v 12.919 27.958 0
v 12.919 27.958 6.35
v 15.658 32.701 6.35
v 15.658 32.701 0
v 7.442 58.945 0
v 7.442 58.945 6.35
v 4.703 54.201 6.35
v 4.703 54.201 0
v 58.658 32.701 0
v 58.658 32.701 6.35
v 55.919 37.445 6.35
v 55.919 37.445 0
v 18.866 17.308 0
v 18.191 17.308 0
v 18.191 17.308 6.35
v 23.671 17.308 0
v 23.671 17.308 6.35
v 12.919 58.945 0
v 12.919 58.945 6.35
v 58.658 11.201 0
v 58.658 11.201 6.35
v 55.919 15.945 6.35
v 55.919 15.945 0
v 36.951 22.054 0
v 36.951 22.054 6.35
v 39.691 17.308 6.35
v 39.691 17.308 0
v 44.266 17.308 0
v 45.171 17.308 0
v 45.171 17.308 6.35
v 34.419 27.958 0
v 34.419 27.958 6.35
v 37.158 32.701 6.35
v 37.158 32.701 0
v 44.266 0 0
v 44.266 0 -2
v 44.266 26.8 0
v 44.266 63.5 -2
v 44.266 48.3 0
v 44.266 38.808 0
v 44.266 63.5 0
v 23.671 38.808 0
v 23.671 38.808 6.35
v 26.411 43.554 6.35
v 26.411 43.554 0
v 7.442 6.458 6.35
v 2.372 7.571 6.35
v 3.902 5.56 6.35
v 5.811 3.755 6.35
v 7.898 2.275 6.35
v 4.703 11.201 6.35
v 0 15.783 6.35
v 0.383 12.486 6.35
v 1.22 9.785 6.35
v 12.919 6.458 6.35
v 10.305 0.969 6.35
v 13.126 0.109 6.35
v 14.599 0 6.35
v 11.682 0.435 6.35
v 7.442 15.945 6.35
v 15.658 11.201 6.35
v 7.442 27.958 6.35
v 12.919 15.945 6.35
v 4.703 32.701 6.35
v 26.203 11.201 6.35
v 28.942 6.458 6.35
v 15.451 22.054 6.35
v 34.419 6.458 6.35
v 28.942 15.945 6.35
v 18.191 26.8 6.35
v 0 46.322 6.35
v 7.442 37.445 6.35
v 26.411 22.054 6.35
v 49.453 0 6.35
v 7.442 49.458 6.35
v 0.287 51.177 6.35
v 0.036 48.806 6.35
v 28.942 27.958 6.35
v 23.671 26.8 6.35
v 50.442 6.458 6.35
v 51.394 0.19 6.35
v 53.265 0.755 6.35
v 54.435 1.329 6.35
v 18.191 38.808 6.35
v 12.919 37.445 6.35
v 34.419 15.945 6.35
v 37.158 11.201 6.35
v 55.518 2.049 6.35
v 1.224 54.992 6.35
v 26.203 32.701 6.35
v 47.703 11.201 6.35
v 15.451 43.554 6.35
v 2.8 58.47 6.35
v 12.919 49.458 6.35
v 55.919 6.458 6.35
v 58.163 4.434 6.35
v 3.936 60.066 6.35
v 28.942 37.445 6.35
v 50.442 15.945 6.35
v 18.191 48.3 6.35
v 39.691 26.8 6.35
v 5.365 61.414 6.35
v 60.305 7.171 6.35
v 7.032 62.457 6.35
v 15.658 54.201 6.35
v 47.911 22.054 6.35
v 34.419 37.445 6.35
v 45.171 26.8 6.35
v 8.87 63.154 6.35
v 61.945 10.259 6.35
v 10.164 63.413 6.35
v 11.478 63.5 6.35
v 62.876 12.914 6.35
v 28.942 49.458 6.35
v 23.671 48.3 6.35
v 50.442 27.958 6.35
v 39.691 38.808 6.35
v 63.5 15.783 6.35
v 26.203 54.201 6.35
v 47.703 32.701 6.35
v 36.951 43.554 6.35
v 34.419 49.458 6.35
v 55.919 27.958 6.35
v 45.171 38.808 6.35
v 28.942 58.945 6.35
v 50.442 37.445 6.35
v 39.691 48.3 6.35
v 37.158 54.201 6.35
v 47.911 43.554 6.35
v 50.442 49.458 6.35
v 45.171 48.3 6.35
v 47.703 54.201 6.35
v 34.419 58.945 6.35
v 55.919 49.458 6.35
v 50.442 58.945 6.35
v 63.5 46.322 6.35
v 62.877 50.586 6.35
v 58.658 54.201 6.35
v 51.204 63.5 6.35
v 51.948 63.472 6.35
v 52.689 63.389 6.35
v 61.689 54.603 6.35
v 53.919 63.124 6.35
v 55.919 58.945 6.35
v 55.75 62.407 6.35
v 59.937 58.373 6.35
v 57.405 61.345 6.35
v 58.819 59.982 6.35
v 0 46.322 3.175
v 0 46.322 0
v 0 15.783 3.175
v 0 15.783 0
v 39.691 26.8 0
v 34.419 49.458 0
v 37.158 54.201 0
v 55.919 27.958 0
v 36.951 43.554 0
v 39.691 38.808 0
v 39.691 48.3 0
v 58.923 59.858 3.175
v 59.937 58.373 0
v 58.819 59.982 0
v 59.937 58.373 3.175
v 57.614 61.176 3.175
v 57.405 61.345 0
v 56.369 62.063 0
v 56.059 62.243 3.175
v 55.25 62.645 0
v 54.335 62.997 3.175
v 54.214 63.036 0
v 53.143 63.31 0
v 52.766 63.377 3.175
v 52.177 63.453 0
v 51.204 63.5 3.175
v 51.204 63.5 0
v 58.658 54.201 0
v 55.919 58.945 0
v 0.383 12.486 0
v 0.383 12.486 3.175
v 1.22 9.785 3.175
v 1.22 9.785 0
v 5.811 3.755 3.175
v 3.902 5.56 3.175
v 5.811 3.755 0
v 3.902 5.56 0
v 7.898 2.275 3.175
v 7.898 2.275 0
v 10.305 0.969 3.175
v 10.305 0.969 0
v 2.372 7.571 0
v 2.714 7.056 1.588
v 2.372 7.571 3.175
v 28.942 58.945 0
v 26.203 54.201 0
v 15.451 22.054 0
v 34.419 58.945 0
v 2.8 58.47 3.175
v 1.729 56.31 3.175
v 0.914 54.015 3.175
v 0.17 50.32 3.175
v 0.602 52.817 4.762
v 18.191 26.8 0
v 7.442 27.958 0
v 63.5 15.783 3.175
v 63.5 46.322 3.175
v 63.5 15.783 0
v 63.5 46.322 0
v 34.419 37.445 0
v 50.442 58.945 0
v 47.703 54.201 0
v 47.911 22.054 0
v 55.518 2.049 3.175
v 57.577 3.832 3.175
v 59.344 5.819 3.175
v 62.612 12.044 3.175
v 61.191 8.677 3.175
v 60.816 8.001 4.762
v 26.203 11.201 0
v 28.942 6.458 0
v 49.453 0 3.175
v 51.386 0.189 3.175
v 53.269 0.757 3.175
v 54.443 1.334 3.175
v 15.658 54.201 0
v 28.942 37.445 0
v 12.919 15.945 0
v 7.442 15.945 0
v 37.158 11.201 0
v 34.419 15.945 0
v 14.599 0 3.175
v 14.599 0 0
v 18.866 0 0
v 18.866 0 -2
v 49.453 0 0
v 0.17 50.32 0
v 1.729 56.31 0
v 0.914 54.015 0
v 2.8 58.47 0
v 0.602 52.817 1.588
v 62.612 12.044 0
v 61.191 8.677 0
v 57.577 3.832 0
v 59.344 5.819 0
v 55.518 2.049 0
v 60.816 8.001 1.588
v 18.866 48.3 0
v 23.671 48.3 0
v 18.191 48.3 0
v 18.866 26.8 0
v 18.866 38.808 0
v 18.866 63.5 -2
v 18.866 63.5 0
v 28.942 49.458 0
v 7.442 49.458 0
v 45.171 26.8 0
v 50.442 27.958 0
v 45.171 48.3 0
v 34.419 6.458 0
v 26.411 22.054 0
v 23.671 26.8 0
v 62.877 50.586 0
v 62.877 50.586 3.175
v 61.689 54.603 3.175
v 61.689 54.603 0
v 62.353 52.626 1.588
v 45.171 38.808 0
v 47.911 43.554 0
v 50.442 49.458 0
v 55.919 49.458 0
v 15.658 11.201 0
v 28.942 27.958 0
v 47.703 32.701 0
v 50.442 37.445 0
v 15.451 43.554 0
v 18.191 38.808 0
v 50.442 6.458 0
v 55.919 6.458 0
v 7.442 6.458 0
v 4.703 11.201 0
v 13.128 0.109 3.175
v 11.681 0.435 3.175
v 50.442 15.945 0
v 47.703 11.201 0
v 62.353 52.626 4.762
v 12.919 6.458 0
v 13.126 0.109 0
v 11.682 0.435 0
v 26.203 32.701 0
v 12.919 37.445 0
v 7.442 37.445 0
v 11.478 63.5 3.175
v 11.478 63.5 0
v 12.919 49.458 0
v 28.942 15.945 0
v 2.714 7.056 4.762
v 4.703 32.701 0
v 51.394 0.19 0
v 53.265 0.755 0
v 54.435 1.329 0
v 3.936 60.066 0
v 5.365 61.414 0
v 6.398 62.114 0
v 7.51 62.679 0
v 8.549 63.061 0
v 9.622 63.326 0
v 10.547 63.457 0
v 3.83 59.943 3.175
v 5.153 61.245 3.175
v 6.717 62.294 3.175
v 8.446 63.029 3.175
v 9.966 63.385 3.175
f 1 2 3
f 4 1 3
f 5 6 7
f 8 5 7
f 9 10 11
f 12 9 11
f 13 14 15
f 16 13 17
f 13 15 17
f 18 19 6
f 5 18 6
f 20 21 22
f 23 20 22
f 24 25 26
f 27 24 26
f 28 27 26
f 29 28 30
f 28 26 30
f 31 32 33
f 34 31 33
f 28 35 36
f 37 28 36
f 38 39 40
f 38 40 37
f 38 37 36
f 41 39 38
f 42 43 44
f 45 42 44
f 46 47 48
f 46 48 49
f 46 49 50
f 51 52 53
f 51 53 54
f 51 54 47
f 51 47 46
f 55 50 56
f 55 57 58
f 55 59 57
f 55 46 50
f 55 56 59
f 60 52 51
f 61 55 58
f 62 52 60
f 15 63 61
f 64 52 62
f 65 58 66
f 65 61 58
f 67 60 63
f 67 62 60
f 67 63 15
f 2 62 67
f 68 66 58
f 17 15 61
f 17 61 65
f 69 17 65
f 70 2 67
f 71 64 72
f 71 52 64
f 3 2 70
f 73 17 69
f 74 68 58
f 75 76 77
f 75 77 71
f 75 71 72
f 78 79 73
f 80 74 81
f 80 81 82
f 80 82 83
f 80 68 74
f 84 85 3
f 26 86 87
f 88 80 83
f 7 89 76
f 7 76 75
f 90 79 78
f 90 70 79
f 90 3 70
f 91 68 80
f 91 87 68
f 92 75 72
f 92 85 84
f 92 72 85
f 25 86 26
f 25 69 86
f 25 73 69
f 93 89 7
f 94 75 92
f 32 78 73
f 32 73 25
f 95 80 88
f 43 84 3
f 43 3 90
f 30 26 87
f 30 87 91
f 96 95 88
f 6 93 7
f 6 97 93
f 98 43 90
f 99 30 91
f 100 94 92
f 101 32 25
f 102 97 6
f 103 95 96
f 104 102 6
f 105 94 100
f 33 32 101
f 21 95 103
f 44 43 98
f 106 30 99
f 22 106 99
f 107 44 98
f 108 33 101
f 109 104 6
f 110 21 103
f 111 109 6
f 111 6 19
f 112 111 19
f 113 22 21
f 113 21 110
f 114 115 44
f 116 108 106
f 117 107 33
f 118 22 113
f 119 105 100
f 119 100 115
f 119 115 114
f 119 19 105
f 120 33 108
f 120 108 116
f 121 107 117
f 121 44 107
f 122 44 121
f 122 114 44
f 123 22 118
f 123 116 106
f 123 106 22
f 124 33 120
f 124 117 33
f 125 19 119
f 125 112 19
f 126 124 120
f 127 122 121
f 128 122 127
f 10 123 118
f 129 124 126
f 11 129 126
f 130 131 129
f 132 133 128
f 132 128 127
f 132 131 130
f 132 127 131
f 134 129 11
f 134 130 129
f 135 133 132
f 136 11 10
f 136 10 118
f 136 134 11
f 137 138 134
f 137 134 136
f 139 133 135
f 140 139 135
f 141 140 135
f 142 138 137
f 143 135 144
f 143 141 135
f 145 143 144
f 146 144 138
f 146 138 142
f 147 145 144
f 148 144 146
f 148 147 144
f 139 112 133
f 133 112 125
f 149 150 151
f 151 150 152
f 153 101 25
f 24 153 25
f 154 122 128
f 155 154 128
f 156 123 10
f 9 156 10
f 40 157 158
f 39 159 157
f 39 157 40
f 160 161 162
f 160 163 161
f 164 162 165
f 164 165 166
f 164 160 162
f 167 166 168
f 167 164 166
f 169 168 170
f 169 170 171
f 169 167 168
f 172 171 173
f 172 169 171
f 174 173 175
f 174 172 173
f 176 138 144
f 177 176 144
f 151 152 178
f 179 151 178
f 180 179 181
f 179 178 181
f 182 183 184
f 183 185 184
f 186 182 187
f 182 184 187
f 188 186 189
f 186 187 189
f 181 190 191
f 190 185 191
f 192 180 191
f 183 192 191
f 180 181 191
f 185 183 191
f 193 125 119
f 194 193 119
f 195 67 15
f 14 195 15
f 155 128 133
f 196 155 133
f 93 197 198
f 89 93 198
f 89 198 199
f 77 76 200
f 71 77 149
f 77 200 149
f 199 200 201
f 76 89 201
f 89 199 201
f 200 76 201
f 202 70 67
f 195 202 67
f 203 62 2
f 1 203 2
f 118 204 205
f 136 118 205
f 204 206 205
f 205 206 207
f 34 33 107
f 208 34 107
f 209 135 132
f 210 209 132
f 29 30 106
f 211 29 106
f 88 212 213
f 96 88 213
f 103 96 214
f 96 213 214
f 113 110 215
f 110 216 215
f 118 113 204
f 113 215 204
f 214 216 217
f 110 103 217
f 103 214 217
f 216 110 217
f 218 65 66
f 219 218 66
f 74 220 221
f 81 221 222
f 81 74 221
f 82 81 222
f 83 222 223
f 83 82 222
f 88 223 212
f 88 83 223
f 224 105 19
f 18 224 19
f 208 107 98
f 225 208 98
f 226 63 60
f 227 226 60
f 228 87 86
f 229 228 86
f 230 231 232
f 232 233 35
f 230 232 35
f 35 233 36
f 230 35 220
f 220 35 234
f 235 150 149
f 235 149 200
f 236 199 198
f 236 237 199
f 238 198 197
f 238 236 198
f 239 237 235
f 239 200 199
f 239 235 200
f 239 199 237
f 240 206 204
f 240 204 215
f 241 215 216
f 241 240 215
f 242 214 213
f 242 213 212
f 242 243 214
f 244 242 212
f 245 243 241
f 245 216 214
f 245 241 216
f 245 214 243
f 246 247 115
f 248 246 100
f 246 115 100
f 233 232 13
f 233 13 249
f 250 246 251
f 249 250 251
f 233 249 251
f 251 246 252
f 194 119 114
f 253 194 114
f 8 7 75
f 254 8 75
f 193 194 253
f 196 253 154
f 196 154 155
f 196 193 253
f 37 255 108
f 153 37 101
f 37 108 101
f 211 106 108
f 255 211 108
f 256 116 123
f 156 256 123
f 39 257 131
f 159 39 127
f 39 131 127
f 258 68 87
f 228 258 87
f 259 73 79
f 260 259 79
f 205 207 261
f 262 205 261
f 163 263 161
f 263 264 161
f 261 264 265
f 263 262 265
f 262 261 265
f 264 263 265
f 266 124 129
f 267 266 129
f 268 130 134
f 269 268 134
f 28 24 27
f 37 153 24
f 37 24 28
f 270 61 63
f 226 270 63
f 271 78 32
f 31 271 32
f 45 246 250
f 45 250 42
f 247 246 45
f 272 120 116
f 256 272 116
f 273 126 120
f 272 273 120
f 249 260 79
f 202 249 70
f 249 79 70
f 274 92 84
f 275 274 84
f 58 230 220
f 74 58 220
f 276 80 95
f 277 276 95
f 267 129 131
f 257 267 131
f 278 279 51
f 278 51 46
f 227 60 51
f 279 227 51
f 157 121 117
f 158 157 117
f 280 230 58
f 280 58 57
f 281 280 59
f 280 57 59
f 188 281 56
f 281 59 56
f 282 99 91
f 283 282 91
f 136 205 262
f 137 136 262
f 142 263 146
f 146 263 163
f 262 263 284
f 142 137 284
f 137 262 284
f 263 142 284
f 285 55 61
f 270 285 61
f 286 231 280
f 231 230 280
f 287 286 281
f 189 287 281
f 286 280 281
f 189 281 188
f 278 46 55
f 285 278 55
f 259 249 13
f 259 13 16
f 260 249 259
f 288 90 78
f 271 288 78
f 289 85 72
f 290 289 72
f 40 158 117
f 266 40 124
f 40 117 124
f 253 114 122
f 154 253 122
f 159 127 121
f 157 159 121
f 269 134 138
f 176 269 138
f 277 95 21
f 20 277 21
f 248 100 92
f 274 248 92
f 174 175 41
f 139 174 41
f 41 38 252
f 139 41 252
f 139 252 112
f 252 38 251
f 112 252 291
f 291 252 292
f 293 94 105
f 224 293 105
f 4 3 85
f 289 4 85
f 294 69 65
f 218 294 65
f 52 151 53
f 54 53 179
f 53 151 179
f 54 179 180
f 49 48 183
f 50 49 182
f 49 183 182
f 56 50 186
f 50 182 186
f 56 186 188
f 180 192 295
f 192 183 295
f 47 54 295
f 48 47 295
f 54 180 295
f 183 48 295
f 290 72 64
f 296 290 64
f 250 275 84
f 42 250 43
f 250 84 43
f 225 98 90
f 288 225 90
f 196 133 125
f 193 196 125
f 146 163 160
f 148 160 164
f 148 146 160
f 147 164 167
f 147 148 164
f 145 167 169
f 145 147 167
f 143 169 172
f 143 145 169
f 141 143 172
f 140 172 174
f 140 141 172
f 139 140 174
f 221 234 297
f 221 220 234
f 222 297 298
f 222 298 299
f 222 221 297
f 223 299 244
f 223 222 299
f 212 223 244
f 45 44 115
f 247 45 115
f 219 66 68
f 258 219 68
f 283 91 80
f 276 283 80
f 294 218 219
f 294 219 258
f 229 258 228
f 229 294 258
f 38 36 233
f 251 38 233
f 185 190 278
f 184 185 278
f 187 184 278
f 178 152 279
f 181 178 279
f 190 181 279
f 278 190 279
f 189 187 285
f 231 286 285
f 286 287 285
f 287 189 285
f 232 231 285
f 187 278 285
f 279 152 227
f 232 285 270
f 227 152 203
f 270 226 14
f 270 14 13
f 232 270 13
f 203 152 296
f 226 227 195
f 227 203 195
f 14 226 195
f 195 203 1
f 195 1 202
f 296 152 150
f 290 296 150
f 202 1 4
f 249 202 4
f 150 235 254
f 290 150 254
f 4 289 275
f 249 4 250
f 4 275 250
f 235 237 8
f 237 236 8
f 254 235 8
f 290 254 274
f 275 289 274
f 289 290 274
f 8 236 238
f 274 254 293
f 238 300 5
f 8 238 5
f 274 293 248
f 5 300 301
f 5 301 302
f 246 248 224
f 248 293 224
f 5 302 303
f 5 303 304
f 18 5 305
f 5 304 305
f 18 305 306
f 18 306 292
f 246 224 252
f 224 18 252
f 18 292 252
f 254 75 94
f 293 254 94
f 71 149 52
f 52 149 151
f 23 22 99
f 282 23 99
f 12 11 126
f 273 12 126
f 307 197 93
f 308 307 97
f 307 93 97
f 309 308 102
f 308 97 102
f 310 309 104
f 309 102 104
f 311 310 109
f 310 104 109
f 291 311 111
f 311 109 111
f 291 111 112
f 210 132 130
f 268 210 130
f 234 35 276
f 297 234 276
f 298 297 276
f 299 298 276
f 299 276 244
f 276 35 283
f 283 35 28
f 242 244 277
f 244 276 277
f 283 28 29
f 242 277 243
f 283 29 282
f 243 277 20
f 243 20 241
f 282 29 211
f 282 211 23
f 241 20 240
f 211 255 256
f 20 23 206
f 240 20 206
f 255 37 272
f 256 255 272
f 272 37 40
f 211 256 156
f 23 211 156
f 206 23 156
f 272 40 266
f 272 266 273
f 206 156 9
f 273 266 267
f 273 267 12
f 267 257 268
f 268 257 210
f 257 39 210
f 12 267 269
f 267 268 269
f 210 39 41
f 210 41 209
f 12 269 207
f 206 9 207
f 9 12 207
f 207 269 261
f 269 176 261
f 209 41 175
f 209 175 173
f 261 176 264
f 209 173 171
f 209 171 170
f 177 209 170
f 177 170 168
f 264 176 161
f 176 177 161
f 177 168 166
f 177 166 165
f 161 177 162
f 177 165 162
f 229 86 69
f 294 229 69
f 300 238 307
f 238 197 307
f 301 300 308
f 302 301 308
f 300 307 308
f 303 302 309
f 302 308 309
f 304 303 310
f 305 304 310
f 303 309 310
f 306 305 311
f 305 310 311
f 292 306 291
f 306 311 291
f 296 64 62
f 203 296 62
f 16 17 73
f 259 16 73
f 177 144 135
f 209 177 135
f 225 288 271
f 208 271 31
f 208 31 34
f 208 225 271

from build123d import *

# Parameters (mm, degrees)
BOSS_EXTRUDE1_DEPTH = 3.175
BOSS_EXTRUDE2_DEPTH = 3.175
SKETCH2_W           = 12.7
SKETCH2_H           = 63.5
BOSS_EXTRUDE3_DEPTH = 2
CUT_EXTRUDE1_DEPTH  = 6.35
FILLET1_R           = 10


with BuildPart() as part:
    # Sketch1 → Boss-Extrude1 (new body)
    with BuildSketch(Plane.XY):
        with BuildLine():
            Line((12.586143856, 0), (52.341618497, 0))
            add(Edge.make_bspline(
                [(63.5, 15.783236994), (61.818196066, 5.163888879), (52.341618497, 0)],
                knots=[0, 0, 0, 1, 1, 1], degree=2))
            Line((63.5, 15.783236994), (63.5, 46.321965318))
            add(Edge.make_bspline(
                [(63.5, 46.321965318), (62.735953046, 56.152543933), (56.305780347, 63.5)],
                knots=[0, 0, 0, 1, 1, 1], degree=2))
            Line((56.305780347, 63.5), (6.82716763, 63.5))
            add(Edge.make_bspline(
                [(0, 46.321965318), (-0.299080934, 56.868733054), (6.82716763, 63.5)],
                knots=[0, 0, 0, 1, 1, 1], degree=2))
            Line((0, 46.321965318), (0, 15.783236994))
            add(Edge.make_bspline(
                [(0, 15.783236994), (0.304891955, 4.651584914), (12.586143856, 0)],
                knots=[0, 0, 0, 1, 1, 1], degree=2))
        make_face()
    extrude(amount=BOSS_EXTRUDE1_DEPTH)

    # Sketch3 → Boss-Extrude2 (add)
    with BuildSketch(Plane.XY.offset(3.175)):
        with BuildLine():
            Line((12.586143857, -1e-09), (52.341618497, 0))
            add(Edge.make_bspline(
                [(52.341618497, 0), (61.818196066, 5.163888879), (63.5, 15.783236995)],
                knots=[0, 0, 0, 1, 1, 1], degree=2))
            Line((63.5, 15.783236995), (63.5, 46.321965318))
            add(Edge.make_bspline(
                [(63.5, 46.321965318), (62.735953046, 56.152543933), (56.305780347, 63.5)],
                knots=[0, 0, 0, 1, 1, 1], degree=2))
            Line((56.305780347, 63.5), (6.82716763, 63.5))
            add(Edge.make_bspline(
                [(6.82716763, 63.5), (-0.299080929, 56.868733059), (0, 46.321965333)],
                knots=[0, 0, 0, 1, 1, 1], degree=2))
            Line((0, 46.321965333), (-2e-09, 15.783237047))
            add(Edge.make_bspline(
                [(-2e-09, 15.783237047), (0.304891926, 4.651584925), (12.586143857, -1e-09)],
                knots=[0, 0, 0, 1, 1, 1], degree=2))
        make_face()
    extrude(amount=BOSS_EXTRUDE2_DEPTH)

    # Sketch2 → Boss-Extrude3 (add)
    with BuildSketch(Plane(origin=(0, 0, 0), x_dir=(-1, 0, 0), z_dir=(0, 0, -1))):
        with Locations((-25.216473988, 31.75)):
            Rectangle(SKETCH2_W, SKETCH2_H)
        with Locations((-37.916473988, 31.75)):
            Rectangle(SKETCH2_W, SKETCH2_H)
    extrude(amount=BOSS_EXTRUDE3_DEPTH)

    # Sketch4 → Cut-Extrude1 (cut)
    with BuildSketch(Plane.XY.offset(6.35)):
        Polygon((47.703064377, 54.201225123), (50.44178546, 49.457621059), (55.919227626, 49.457621059), (58.657948709, 54.201225123), (55.919227626, 58.944829186), (50.44178546, 58.944829186), align=None)
        Polygon((36.950506543, 43.554276624), (39.690506543, 38.808457411), (45.170506543, 38.808457411), (47.910506543, 43.554276624), (45.170506543, 48.300095837), (39.690506543, 48.300095837), align=None)
        Polygon((47.703064377, 32.701225123), (50.44178546, 27.957621059), (55.919227626, 27.957621059), (58.657948709, 32.701225123), (55.919227626, 37.444829186), (50.44178546, 37.444829186), align=None)
        Polygon((36.950506543, 22.054276624), (39.690506543, 17.308457411), (45.170506543, 17.308457411), (47.910506543, 22.054276624), (45.170506543, 26.800095837), (39.690506543, 26.800095837), align=None)
        Polygon((47.703064377, 11.201225123), (50.44178546, 6.457621059), (55.919227626, 6.457621059), (58.657948709, 11.201225123), (55.919227626, 15.944829186), (50.44178546, 15.944829186), align=None)
        Polygon((26.203064377, 11.201225123), (28.94178546, 6.457621059), (34.419227626, 6.457621059), (37.157948709, 11.201225123), (34.419227626, 15.944829186), (28.94178546, 15.944829186), align=None)
        Polygon((26.203064377, 32.701225123), (28.94178546, 27.957621059), (34.419227626, 27.957621059), (37.157948709, 32.701225123), (34.419227626, 37.444829186), (28.94178546, 37.444829186), align=None)
        Polygon((26.203064377, 54.201225123), (28.94178546, 49.457621059), (34.419227626, 49.457621059), (37.157948709, 54.201225123), (34.419227626, 58.944829186), (28.94178546, 58.944829186), align=None)
        Polygon((15.450506543, 43.554276624), (18.190506543, 38.808457411), (23.670506543, 38.808457411), (26.410506543, 43.554276624), (23.670506543, 48.300095837), (18.190506543, 48.300095837), align=None)
        Polygon((4.703064377, 54.201225123), (7.44178546, 49.457621059), (12.919227626, 49.457621059), (15.657948709, 54.201225123), (12.919227626, 58.944829186), (7.44178546, 58.944829186), align=None)
        Polygon((4.703064377, 32.701225123), (7.44178546, 27.957621059), (12.919227626, 27.957621059), (15.657948709, 32.701225123), (12.919227626, 37.444829186), (7.44178546, 37.444829186), align=None)
        Polygon((15.450506543, 22.054276624), (18.190506543, 17.308457411), (23.670506543, 17.308457411), (26.410506543, 22.054276624), (23.670506543, 26.800095837), (18.190506543, 26.800095837), align=None)
        Polygon((4.703064377, 11.201225123), (7.44178546, 6.457621059), (12.919227626, 6.457621059), (15.657948709, 11.201225123), (12.919227626, 15.944829186), (7.44178546, 15.944829186), align=None)
    extrude(amount=-CUT_EXTRUDE1_DEPTH, mode=Mode.SUBTRACT)

    # Fillet1
    fillet1_edges = [part.edges().sort_by_distance(p)[0] for p in [
        (56.305780347, 63.5, 4.7625),
        (52.341618497, 0, 1.5875),
        (12.586143856, 0, 1.5875),
        (6.82716763, 63.5, 4.7625),
        (56.305780347, 63.5, 1.5875),
        (52.341618497, 0, 4.7625),
        (12.586143857, -1e-09, 4.7625),
        (6.82716763, 63.5, 1.5875),
    ]]
    fillet(fillet1_edges, radius=FILLET1_R)


solid = part.part
